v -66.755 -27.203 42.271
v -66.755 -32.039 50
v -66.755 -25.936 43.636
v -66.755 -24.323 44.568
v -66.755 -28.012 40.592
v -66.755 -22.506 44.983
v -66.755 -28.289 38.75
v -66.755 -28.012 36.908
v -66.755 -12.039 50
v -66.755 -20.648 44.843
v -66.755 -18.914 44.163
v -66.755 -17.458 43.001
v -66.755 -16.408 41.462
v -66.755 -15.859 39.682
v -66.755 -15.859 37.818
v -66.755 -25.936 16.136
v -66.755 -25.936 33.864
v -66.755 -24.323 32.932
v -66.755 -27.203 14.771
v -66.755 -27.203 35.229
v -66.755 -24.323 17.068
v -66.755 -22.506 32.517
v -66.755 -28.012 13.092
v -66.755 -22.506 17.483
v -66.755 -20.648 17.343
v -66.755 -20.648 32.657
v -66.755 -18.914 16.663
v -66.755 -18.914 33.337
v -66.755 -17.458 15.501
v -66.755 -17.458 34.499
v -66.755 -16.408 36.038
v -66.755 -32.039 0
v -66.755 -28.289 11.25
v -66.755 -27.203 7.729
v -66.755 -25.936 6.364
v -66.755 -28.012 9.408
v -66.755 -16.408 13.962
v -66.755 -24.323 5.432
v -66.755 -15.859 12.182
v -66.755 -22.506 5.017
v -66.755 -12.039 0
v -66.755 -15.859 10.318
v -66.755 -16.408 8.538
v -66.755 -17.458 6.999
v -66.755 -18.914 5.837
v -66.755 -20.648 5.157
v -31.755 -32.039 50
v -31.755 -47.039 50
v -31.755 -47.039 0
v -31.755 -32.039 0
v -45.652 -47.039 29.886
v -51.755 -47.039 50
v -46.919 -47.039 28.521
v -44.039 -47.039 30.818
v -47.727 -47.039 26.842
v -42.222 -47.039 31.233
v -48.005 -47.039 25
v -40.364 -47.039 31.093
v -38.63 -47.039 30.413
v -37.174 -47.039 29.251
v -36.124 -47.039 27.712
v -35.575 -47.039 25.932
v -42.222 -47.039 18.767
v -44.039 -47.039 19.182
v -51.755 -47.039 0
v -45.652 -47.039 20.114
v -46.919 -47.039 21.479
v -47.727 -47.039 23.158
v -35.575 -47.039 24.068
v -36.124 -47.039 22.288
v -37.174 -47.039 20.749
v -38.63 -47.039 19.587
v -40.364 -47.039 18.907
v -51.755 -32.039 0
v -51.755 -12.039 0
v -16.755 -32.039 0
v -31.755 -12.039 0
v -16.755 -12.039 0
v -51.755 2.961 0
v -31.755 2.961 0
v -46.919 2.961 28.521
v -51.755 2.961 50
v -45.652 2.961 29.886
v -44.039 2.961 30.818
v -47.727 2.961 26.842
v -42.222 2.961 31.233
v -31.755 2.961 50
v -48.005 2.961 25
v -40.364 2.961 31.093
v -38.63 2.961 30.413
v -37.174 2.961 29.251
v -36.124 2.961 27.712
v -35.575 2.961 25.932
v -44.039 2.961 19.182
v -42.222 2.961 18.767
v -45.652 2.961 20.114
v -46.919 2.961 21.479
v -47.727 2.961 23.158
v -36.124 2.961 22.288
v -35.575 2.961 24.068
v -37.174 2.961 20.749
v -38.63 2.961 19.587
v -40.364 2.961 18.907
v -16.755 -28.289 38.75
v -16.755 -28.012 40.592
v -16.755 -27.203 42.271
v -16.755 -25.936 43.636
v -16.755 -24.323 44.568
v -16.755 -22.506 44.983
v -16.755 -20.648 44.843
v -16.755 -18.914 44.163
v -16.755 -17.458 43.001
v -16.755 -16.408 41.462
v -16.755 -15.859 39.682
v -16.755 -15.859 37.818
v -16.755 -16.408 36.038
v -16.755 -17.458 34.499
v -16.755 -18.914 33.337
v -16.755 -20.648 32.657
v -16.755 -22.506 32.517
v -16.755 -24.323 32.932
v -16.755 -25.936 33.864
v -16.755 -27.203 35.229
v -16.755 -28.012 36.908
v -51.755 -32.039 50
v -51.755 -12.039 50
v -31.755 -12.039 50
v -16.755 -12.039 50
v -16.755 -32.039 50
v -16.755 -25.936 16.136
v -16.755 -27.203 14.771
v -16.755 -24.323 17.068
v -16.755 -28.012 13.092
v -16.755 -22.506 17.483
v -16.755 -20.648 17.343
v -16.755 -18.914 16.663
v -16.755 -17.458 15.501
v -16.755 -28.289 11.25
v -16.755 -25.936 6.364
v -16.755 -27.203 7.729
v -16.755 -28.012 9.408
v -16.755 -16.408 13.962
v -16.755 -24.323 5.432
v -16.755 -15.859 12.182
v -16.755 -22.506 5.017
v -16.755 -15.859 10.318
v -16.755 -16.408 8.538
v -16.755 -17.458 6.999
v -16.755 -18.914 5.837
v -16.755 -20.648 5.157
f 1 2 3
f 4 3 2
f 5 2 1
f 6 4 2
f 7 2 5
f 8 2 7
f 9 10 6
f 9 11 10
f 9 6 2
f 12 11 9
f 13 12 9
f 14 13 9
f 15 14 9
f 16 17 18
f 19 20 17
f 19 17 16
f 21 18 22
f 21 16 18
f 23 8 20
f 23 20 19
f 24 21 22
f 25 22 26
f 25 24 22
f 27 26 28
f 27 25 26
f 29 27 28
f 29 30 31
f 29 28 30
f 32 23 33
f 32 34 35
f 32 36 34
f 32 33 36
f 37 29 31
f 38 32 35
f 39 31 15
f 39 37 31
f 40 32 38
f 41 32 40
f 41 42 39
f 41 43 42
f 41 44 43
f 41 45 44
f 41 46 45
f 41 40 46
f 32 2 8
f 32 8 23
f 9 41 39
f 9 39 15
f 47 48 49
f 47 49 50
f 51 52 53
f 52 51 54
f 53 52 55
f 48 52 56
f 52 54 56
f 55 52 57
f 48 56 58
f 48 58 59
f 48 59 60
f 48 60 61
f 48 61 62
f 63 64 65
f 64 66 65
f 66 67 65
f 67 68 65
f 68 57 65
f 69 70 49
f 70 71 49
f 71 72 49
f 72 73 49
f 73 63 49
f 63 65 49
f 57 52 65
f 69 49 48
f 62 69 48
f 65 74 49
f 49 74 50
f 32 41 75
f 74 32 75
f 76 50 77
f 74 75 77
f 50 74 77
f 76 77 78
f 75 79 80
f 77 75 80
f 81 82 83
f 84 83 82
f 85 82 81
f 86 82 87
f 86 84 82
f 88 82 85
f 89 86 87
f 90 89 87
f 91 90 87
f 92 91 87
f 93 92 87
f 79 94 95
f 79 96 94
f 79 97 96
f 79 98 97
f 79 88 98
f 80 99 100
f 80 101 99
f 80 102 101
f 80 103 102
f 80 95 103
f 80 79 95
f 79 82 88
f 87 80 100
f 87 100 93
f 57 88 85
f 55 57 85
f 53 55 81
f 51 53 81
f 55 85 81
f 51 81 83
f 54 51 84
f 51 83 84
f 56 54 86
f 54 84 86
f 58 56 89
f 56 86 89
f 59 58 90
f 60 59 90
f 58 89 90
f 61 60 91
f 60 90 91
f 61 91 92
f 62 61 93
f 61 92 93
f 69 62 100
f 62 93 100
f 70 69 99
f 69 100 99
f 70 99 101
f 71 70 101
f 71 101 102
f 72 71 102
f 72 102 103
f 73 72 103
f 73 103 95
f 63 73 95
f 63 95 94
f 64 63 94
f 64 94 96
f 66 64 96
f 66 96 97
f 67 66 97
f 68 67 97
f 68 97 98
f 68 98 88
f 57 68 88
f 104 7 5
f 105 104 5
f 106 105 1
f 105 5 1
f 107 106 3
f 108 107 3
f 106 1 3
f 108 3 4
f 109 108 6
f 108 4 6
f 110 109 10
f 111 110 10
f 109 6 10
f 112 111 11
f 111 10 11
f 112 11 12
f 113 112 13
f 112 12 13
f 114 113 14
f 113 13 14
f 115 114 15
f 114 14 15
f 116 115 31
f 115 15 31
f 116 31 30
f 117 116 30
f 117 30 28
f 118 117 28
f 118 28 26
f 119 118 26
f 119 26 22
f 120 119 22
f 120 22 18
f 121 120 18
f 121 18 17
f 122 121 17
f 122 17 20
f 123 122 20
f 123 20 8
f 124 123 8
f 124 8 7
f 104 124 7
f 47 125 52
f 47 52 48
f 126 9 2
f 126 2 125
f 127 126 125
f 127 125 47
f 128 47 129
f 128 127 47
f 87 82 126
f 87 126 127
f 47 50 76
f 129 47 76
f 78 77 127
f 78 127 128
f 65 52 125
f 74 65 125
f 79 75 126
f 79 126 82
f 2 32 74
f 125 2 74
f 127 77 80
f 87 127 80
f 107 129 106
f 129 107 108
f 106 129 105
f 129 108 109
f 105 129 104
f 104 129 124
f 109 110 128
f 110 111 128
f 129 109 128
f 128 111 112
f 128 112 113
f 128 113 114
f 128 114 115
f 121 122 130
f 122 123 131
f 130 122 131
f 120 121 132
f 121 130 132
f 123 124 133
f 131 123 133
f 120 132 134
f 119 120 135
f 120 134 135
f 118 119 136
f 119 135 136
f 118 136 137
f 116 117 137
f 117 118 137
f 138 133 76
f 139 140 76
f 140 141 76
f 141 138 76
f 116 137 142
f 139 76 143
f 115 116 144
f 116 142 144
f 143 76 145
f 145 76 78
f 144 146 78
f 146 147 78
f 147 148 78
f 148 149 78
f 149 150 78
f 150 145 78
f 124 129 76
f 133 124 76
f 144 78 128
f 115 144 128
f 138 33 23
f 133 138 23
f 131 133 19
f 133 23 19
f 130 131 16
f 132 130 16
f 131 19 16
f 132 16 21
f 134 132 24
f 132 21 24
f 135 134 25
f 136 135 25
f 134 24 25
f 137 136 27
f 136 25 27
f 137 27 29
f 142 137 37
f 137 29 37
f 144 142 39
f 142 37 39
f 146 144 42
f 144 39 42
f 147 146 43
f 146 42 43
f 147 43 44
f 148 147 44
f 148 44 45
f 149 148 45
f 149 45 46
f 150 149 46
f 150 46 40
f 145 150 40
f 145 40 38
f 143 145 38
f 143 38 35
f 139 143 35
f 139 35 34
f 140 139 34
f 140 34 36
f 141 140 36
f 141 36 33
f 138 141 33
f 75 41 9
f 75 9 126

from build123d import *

# Parameters (mm, degrees)
F0_W      = 50
F0_H      = 50
F1_DEPTH  = 50
F2_R      = 6.25
F3_DEPTH  = 50.001
F4_R      = 6.25
F5_DEPTH  = 50.001
F6_R      = 6.25
F7_DEPTH  = 50.001
F8_W      = 15
F8_H      = 15
F9_DEPTH  = 50.001
F10_W     = 15
F10_H     = 15
F11_DEPTH = 50.001
F12_W     = 15
F12_H     = 15
F13_DEPTH = 50.001
F14_W     = 15
F14_H     = 15
F15_DEPTH = 50.001


with BuildPart() as f1:
    # F0 (on Top) → F1 (new body)
    with BuildSketch(Plane.XY):
        with Locations((-41.755149, -22.039188)):
            Rectangle(F0_W, F0_H)
    extrude(amount=F1_DEPTH)

    # F2 (on face) → F3 (cut, through all)
    with BuildSketch(Plane(origin=(-66.755149, 0, 0), x_dir=(0, -1, 0), z_dir=(-1, 0, 0))):
        with Locations((22.039188, 38.75)):
            Circle(F2_R)
    extrude(amount=-F3_DEPTH, mode=Mode.SUBTRACT)

    # F4 (on face) → F5 (cut, through all)
    with BuildSketch(Plane(origin=(-66.755149, 0, 0), x_dir=(0, -1, 0), z_dir=(-1, 0, 0))):
        with Locations((22.039188, 11.25)):
            Circle(F4_R)
    extrude(amount=-F5_DEPTH, mode=Mode.SUBTRACT)

    # F6 (on face) → F7 (cut, through all)
    with BuildSketch(Plane(origin=(0, 2.960812, 0), x_dir=(-1, 0, 0), z_dir=(0, 1, 0))):
        with Locations((41.755149, 25)):
            Circle(F6_R)
    extrude(amount=-F7_DEPTH, mode=Mode.SUBTRACT)

    # F8 (on face) → F9 (cut, through all)
    with BuildSketch(Plane.XY.offset(50)):
        with Locations((-59.255149, -39.539188)):
            Rectangle(F8_W, F8_H)
    extrude(amount=-F9_DEPTH, mode=Mode.SUBTRACT)

    # F10 (on face) → F11 (cut, through all)
    with BuildSketch(Plane.XY.offset(50)):
        with Locations((-59.255149, -4.539188)):
            Rectangle(F10_W, F10_H)
    extrude(amount=-F11_DEPTH, mode=Mode.SUBTRACT)

    # F12 (on face) → F13 (cut, through all)
    with BuildSketch(Plane.XY.offset(50)):
        with Locations((-24.255149, -4.539188)):
            Rectangle(F12_W, F12_H)
    extrude(amount=-F13_DEPTH, mode=Mode.SUBTRACT)

    # F14 (on face) → F15 (cut, through all)
    with BuildSketch(Plane.XY.offset(50)):
        with Locations((-24.255149, -39.539188)):
            Rectangle(F14_W, F14_H)
    extrude(amount=-F15_DEPTH, mode=Mode.SUBTRACT)


solid = f1.part
